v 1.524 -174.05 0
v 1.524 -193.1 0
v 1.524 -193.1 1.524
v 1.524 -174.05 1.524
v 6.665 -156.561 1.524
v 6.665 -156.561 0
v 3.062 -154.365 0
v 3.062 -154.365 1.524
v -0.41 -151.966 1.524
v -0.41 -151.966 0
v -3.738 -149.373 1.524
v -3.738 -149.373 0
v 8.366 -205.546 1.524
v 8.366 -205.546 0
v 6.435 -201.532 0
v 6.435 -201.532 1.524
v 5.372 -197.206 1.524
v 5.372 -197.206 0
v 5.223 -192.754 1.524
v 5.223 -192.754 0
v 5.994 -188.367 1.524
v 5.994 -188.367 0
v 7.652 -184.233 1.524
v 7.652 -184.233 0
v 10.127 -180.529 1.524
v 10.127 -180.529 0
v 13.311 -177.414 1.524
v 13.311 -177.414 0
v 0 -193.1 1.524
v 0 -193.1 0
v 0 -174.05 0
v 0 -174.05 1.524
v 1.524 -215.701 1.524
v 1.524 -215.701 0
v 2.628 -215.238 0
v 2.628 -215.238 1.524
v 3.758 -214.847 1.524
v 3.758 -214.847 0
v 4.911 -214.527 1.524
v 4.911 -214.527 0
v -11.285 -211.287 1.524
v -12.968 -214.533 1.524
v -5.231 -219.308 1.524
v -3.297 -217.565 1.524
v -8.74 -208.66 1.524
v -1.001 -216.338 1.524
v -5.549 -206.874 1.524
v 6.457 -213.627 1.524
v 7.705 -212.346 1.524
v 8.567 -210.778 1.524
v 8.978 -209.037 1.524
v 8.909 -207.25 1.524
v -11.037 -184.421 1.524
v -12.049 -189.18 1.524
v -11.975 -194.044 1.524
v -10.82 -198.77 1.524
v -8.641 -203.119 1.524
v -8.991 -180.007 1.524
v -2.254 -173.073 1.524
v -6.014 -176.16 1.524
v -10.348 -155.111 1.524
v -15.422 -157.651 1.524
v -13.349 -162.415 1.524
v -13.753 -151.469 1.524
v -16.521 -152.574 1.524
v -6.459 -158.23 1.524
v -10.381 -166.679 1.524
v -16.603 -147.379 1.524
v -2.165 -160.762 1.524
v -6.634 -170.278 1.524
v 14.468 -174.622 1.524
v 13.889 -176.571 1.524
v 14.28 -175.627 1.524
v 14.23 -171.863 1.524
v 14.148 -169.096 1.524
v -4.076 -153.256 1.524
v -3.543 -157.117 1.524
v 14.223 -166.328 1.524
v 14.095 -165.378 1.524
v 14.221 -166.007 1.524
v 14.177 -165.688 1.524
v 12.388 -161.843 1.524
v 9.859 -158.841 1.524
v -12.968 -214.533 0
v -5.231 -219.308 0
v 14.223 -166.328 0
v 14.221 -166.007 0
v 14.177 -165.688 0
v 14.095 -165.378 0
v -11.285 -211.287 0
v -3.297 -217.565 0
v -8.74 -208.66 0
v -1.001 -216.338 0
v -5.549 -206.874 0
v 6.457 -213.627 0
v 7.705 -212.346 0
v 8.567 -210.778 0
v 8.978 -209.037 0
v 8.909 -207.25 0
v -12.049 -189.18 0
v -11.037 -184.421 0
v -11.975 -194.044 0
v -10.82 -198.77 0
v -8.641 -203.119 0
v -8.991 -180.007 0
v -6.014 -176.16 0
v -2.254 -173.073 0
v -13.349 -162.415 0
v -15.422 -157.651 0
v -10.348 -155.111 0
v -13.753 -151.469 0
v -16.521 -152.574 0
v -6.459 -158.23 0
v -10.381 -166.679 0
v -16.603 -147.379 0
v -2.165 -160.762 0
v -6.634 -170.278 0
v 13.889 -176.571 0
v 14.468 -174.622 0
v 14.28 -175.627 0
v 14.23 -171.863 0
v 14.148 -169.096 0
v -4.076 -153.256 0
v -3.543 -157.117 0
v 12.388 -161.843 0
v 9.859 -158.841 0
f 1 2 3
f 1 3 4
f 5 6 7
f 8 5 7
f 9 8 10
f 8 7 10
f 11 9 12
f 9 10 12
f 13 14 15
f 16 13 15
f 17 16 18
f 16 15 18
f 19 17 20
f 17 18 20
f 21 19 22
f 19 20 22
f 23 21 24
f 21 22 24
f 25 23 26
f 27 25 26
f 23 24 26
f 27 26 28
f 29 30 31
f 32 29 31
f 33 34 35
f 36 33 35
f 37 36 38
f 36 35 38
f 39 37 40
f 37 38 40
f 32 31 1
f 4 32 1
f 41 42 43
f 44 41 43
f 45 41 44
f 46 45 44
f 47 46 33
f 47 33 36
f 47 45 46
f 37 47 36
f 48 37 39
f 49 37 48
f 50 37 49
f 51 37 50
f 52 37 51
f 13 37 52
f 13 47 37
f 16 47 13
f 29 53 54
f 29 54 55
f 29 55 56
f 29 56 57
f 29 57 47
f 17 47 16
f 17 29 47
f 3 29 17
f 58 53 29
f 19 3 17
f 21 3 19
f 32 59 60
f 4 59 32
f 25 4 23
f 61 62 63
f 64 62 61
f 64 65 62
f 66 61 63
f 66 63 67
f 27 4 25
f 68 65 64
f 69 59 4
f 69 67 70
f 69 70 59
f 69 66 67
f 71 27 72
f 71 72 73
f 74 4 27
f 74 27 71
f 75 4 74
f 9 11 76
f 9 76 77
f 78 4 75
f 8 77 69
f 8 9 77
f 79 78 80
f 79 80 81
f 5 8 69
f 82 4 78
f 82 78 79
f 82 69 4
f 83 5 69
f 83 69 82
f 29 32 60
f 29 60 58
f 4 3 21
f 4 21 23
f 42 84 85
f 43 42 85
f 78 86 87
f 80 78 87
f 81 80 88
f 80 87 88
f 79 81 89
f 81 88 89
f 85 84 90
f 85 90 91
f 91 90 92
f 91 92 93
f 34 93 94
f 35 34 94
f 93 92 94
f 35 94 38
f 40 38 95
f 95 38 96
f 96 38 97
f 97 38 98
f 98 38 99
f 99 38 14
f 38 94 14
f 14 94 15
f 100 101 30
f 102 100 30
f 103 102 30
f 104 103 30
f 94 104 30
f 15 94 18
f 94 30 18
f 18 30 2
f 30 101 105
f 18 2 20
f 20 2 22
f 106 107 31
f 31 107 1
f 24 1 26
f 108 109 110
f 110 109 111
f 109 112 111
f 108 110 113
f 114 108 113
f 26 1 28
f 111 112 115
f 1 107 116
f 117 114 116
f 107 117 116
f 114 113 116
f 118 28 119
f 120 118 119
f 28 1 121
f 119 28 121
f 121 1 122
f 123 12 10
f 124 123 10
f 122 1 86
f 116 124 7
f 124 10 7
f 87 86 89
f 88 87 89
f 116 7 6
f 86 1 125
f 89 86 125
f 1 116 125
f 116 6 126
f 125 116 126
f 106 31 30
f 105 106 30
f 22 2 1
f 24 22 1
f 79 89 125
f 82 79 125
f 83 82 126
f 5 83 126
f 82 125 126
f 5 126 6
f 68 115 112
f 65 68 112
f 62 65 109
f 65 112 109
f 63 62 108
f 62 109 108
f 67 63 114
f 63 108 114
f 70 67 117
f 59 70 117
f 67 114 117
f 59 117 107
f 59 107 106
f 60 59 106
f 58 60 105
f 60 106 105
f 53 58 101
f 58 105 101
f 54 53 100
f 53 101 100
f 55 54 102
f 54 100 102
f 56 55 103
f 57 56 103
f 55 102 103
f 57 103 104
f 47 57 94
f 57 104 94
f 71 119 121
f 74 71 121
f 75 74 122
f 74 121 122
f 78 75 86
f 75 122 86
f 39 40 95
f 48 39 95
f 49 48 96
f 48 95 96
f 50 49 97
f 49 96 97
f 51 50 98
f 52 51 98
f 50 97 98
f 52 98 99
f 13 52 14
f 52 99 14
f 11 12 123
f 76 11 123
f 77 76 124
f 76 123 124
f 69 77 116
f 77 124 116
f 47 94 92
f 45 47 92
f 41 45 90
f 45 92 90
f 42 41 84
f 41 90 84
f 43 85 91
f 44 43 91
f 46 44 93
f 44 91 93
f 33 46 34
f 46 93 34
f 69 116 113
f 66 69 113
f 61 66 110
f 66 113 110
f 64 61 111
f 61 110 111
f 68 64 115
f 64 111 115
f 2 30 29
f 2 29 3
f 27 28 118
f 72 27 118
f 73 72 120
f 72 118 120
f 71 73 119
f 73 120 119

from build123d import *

# Parameters (mm, degrees)
SKETCH1_W           = 1.524
SKETCH1_H           = 19.05
BOSS_EXTRUDE1_DEPTH = 1.524


with BuildPart() as part:
    # Sketch1 → Boss-Extrude1 (new body)
    with BuildSketch(Plane.XY):
        with BuildLine():
            Line((-12.968401667, -214.533069625), (-5.231008599, -219.308220204))
            ThreePointArc((-5.231008599, -219.308220204), (-2.186267033, -216.881335926), (1.524, -215.700600116))
            ThreePointArc((1.524, -215.700600116), (3.189789502, -215.033578347), (4.911266579, -214.527328034))
            ThreePointArc((4.911266579, -214.527328034), (8.56652215, -210.778134694), (8.366250568, -205.545808702))
            ThreePointArc((8.366250568, -205.545808702), (5.494506116, -190.54054727), (13.311403321, -177.414203341))
            ThreePointArc((13.311403321, -177.414203341), (14.109075531, -176.108897248), (14.468404268, -174.621958174))
            ThreePointArc((14.468404268, -174.621958174), (14.169609027, -170.48015642), (14.223154403, -166.327936138))
            ThreePointArc((14.223154403, -166.327936138), (14.204082667, -165.84665661), (14.094500503, -165.377630529))
            ThreePointArc((14.094500503, -165.377630529), (11.21769373, -160.262840376), (6.664633993, -156.56057856))
            ThreePointArc((6.664633993, -156.56057856), (1.308827331, -153.190269752), (-3.738486028, -149.373428868))
            ThreePointArc((-3.738486028, -149.373428868), (-3.917462061, -155.201242728), (-2.164967532, -160.762196757))
            ThreePointArc((-2.164967532, -160.762196757), (-10.348444798, -155.111050325), (-16.602878059, -147.37885654))
            ThreePointArc((-16.602878059, -147.37885654), (-13.34872328, -162.415016966), (-2.254215141, -173.07276217))
            ThreePointArc((-2.254215141, -173.07276217), (-12.048739338, -189.17955679), (-5.548621032, -206.874471292))
            ThreePointArc((-5.548621032, -206.874471292), (-10.108356413, -209.880426072), (-12.968401667, -214.533069625))
        make_face()
        with Locations((0.762, -183.574694423)):
            Rectangle(SKETCH1_W, SKETCH1_H, mode=Mode.SUBTRACT)
    extrude(amount=BOSS_EXTRUDE1_DEPTH)


solid = part.part
